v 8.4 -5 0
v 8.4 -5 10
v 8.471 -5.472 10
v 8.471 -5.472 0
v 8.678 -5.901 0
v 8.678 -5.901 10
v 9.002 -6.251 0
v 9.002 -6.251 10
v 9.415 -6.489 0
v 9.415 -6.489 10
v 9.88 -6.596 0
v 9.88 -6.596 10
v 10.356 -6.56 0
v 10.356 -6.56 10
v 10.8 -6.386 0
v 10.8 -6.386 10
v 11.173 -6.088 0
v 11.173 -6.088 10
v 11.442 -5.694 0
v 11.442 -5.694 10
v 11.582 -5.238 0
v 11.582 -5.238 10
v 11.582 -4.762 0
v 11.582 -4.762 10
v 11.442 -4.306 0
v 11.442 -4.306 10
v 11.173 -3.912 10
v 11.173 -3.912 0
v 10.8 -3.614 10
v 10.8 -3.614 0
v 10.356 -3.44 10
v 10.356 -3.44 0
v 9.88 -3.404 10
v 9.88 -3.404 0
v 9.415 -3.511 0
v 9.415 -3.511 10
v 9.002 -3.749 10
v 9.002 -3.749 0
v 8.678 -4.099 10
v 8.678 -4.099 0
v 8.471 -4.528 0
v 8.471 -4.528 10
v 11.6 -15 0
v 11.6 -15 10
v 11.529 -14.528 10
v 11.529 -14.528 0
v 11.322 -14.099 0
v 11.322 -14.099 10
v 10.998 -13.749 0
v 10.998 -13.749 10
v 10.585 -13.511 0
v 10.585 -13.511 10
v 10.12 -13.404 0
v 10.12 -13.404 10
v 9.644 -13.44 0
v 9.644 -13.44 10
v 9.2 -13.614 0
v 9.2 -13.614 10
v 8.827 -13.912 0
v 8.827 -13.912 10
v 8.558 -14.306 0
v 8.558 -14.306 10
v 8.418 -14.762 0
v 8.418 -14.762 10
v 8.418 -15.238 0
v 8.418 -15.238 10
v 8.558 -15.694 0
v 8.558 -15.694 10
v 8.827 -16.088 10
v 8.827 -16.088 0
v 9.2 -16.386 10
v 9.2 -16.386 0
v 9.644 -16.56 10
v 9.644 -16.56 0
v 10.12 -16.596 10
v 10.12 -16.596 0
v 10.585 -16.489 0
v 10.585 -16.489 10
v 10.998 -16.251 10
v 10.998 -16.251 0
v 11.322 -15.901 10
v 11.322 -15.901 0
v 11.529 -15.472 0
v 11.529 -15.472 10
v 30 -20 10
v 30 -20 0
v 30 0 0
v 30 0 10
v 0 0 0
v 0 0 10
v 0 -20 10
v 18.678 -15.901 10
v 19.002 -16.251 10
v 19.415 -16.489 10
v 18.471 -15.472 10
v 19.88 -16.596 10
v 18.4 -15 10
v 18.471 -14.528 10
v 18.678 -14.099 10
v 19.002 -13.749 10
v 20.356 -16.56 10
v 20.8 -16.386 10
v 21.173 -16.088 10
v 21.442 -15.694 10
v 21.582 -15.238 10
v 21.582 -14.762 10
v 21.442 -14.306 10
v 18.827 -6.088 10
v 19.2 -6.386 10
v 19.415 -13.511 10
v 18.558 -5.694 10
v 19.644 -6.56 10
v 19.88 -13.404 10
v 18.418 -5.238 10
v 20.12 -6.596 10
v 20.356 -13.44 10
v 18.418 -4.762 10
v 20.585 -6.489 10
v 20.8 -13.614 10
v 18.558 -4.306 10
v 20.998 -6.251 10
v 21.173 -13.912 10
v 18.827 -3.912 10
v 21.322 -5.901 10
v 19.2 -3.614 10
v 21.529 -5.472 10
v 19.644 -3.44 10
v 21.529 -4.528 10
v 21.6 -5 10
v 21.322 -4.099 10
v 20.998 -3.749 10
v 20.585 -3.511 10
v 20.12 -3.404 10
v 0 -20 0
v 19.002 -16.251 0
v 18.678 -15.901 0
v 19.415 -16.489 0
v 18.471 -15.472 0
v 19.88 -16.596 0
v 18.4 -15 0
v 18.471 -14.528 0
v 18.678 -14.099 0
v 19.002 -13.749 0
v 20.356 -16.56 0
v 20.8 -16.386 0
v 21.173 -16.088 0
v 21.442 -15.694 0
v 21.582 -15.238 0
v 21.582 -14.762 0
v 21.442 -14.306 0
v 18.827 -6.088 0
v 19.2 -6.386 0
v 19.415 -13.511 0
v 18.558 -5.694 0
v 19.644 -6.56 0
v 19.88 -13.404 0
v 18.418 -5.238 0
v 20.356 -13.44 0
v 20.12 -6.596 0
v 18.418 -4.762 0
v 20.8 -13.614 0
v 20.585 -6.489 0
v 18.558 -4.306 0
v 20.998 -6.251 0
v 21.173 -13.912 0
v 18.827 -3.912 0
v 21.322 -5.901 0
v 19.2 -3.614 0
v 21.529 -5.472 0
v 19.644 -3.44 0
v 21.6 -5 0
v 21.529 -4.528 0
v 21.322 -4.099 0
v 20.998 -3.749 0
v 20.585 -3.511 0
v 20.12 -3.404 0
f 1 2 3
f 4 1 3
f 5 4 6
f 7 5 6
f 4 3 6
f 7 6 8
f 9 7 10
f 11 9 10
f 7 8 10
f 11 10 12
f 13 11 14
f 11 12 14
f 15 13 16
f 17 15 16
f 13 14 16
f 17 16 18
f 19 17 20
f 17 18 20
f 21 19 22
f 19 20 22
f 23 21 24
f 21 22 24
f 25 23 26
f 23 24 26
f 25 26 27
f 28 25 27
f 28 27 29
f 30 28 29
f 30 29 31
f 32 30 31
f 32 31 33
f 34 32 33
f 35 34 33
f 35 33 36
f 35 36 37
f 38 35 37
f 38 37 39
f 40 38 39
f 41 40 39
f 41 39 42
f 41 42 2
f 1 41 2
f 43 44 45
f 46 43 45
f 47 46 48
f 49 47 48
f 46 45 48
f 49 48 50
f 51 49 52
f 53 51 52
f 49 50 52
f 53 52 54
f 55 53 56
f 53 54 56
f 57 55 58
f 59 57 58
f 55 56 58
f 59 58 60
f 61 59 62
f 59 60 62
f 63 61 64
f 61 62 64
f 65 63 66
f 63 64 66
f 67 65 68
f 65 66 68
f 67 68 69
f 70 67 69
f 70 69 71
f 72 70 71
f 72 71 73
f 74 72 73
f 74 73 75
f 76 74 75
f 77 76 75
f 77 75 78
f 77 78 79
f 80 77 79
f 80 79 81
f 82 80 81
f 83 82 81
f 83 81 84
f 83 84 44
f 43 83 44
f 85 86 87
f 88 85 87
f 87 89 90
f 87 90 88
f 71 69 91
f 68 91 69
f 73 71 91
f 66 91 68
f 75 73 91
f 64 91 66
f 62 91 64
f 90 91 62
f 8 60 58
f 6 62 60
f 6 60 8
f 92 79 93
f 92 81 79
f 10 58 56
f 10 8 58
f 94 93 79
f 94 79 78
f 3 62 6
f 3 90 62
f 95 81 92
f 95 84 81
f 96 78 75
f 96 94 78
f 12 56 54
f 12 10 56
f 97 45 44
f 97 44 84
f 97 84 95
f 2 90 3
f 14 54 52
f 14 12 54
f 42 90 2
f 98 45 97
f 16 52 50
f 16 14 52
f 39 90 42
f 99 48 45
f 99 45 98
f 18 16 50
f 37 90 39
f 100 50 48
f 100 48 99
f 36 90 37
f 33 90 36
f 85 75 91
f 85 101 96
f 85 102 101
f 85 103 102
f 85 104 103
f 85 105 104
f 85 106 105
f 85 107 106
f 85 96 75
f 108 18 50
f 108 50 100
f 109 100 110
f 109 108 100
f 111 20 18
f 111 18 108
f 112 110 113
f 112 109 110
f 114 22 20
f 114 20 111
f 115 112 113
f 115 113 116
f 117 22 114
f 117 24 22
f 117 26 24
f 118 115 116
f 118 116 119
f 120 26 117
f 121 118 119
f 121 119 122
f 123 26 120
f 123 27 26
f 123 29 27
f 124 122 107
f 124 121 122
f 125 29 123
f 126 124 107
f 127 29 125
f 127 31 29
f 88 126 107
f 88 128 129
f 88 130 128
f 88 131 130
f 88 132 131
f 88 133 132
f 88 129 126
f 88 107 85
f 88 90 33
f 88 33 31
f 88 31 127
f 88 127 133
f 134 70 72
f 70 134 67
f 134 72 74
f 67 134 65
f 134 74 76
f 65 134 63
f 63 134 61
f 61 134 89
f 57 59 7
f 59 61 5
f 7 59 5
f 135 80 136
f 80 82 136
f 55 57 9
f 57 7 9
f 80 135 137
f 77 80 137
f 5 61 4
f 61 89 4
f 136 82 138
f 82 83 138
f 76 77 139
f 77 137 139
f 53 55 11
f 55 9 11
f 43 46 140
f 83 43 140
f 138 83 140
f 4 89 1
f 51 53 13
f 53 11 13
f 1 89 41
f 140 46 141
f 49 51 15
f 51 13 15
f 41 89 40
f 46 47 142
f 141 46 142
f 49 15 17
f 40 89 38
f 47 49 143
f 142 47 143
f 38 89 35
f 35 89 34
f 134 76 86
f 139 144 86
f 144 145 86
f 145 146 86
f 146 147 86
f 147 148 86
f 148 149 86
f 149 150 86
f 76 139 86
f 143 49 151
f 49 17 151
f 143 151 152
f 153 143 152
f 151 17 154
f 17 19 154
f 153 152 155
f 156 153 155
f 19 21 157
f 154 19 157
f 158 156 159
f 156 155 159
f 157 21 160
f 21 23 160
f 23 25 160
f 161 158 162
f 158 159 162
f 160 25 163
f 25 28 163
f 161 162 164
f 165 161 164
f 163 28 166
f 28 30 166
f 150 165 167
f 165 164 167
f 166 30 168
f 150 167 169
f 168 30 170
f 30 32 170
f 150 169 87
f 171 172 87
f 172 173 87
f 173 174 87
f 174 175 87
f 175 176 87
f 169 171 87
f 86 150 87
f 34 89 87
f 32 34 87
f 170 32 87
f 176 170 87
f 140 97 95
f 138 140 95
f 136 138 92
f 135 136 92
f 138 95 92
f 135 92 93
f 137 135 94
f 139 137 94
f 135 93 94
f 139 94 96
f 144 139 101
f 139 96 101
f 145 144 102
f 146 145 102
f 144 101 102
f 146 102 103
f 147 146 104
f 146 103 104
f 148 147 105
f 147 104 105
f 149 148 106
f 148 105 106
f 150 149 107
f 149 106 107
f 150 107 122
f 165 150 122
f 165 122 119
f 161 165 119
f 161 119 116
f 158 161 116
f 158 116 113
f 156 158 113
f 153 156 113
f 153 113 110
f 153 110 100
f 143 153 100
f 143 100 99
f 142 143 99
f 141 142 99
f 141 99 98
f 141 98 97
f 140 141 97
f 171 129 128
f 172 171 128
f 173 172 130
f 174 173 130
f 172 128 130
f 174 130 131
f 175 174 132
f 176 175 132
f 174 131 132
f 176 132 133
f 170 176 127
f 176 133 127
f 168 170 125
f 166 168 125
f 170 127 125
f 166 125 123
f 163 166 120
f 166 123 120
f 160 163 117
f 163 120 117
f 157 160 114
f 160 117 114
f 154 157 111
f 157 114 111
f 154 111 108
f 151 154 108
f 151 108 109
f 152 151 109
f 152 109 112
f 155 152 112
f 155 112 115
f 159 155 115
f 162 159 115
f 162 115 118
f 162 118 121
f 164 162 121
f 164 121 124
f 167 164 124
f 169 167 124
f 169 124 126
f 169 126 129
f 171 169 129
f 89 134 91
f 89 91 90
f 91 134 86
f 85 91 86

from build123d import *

# Parameters (mm, degrees)
SKETCH_1_W          = 30
SKETCH_1_H          = 20
EXTRUDE_1_DEPTH     = 10
SKETCH_2_R          = 1.6
CUT_EXTRUDE_1_DEPTH = 38.416573868


with BuildPart() as part:
    # 草图1 → 凸台-拉伸1 (new body)
    with BuildSketch(Plane.XY):
        with Locations((15, -10)):
            Rectangle(SKETCH_1_W, SKETCH_1_H)
    extrude(amount=EXTRUDE_1_DEPTH)

    # 草图2 → 切除-拉伸1 (cut, through all)
    with BuildSketch(Plane.XY.offset(10)):
        with Locations(Location((10, -5, 0), (0, 0, 180))):
            Circle(SKETCH_2_R)
        with Locations((10, -15)):
            Circle(SKETCH_2_R)
        with Locations(Location((20, -15, 0), (0, 0, 180))):
            Circle(SKETCH_2_R)
        with Locations((20, -5)):
            Circle(SKETCH_2_R)
    extrude(amount=-CUT_EXTRUDE_1_DEPTH, mode=Mode.SUBTRACT)


solid = part.part
